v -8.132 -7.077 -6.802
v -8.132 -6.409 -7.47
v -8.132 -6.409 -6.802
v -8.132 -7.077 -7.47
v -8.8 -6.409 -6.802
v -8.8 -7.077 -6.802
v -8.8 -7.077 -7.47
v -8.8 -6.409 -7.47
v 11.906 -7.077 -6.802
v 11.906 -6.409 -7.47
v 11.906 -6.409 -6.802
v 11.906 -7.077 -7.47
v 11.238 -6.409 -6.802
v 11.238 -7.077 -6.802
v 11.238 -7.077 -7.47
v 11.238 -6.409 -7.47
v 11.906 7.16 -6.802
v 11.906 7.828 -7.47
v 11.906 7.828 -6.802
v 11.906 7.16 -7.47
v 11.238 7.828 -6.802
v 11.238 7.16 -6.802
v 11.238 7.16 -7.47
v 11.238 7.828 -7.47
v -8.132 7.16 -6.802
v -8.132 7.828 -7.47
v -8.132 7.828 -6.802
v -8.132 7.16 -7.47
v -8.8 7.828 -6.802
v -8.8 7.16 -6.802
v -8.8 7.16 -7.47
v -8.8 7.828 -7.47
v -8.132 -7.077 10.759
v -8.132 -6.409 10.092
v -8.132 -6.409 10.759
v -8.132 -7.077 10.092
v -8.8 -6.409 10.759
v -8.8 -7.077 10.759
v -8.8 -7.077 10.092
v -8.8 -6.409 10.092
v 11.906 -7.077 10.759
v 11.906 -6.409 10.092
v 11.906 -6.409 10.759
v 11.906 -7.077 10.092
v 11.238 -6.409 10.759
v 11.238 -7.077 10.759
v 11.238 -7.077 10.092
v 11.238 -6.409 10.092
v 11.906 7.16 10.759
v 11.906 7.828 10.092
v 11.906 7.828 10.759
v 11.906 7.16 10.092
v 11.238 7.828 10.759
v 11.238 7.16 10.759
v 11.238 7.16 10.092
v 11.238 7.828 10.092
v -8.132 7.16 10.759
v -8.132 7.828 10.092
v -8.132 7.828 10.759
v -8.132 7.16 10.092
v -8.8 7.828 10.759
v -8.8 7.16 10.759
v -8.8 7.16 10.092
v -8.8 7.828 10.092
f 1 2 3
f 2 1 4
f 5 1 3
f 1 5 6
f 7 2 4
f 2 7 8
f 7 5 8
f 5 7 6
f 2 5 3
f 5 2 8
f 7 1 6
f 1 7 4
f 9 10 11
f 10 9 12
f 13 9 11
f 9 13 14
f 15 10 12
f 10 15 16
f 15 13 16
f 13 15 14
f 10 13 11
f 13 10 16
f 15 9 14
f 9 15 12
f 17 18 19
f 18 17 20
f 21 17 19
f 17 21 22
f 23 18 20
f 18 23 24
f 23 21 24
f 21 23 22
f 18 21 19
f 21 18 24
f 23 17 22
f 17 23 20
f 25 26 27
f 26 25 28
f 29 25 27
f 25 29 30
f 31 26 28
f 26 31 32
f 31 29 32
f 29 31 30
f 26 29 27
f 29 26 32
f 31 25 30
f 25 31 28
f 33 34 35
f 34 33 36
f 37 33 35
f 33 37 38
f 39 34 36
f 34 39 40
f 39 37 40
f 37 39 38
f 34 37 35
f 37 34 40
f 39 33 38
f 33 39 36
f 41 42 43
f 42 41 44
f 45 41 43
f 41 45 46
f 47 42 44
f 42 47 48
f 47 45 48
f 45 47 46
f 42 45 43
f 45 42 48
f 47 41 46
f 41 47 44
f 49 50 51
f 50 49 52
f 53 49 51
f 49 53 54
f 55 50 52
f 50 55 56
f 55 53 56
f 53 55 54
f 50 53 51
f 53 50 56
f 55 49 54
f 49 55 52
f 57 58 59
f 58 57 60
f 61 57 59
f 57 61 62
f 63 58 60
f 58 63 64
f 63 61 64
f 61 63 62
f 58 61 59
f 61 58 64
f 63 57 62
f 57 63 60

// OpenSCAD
opU = 1; // 1 union
opI = 2; // 1 intersection
opS = 3; // 1 subtraction
opT = 4; // M transformation 4X4 functional
opH = 5; // 1 Convex hull
opE = 6; // 3 Extrude 2d shape, simple Z extrude of a subtree of Z plane cut (Q collapsed to z=0)
opO = 7; // 1 offset usually by distance but xyz surface normal or ambinet occlusion is possiblites
opD = 8; // ""not impleneted"" deformation modifyers [twist, bend, pinch, displace, taper]
opX = 9; // ""not impleneted"" deformation modifyers [twist, bend, pinch, displace, taper]
f_cube = 10; // unit radius cube
f_sphere = 11; // unit radius sphere
f_torus = 12; // unit radius torus
//named numbers
opc = 0;params = 1;subTree = 2;x = 0;y = 1;z = 2;null3 = [0, 0, 0];tiny = 0.01;far = 10000;
 
//scenegraph descriptor
scenegraph = [opT, [ [1,0, 1], [0, 0, 0], [1, 1, 1] ],
 [ [opT, [ [0, 0, 0], [0, 0, 0], [1, 1, 1] ],
     [ [opU, 0/*round union !!*/, [ 
         [opT, [  [ 0, 0  , 0],   [-54.4881, -1.1109, -21.3758],  [1, 1, 1] ],
             [  [f_sphere, [[15,12,9], 3,1]] ]]
 


         ]
    ]
    ]
 ]
 ]
];
// scenegraph=[opT,[ [ 00, 0, 0],[ 0, 0,0],[ 1, 1,1]],
//  [[opO,0,
// 
// [ [cR3,[5]] ,[cR3,[3]] 
// 
// ]]
// ]];
//////////////////////////////////////////////////////////////////////////////////////
//////////////////////////////////////////////////////////////////////////////////////
// It starts here
 cell = autobound(scenegraph, cubic = false, pad = 0.125);
 
//cell = [[-10,-10,-10],[10,10,10]];
 
*translate([100, 0, 0]) color("Red") showcell(cell);
*translate([100, 0, 0]) unglymarch(scenegraph, cell, c = 6);

*color("Red") showcell(cell);
* showfield(scenegraph, cell*2, len3(cell[1] -
 cell[0]) / 100);
 
translate([-0, 0, 0]) color("Red") showcell(cell);
 
translate([ 0, 0, 0]) DualC(scenegraph, cell , depth =3);
 

//////////////////////////////////////////////////////////////////////////////////////
/* Dual Contour 
 This DC runs in two stages because unmutable data and fake QEF solver
 first we run trough all octnodes with sign change
 for each find each crossed edge, construct planes, encode cell hash,
 return a [hash of the cellbase coord, a vertex coord, 
 3 prototype faces to hypothetical neighbous hashes,list of feature planes] 
 all these cell packages are concatenated to a list and the octtree is done with

 The list is filtered for some junk
 A clean list of points is established each with corresponding index as the filterlist

 A face worker runs the raw hash referencing faces searches for points with corresponding hash and building a list of faces with point index instead of hash numbers 

 Usually the fitting of features are done in the octtree but here its delayed to after a mesh connectivity is established.
We establish a list of neighbouring faces for each point and calculate each face mindpoint.
since each ponit now is associated with a bag of planes
we can iterativley constrain each point closer to an avarege of its feature planes
and circumvent the QEF solver.
A few loops alternating constraining to planes and avareging between neigbours
results in a nicelt spaced mesh. (a few edgecase bugs)
*/
module DualC(scene, cell_in, depth = 3) {
 cell = len(cell_in) == 0 ? autobound(scene, cubic = false, pad =
 0.5) : cell_in;* color("Red") showcell(cell);
 RawMesh = octree(cell, scene, depth);
 t = polishup(RawMesh, cell);
 //// echo(cell,len(t[0]),len(t[1]) );
// for(i=t[0])echo(i);
 //// polyhedron(t[0], t[1]);
trender2(t);
texport(t);
}

function polishup(v, cell) =
let (filterv = [
 for (i = [0: len(v) - 1])
 if (v[i][1][0] != undef) v[i]
 ], points = [
 for (i = [0: len(filterv) - 1]) filterv[i][1]
 ], 
// for(i=[0:len(v)-1]){if(v[i][1][0] !=undef) echo (v[i]);//translate(v[i][1])cube(0.6);}
 faces = faceworker(filterv), 
neighbours = [ for (i = [0: len(points) - 1])[ for (j = [0: len(faces) - 1])
 if (faces[j][0] == i || faces[j][1] == i || faces[j][2] == i || faces[j][3] == i) j] ], 
t = relax(points, faces, neighbours, filterv, cell))
t
//[points,faces]
;

function relax(points, faces, neighbours, filterv, cell, c =  25) = c >
 0 ?
 let (midpoints = [
 for (i = [0: len(faces) - 1]) avrg(
 [points[faces[i][0]], points[faces[i][1]], points[faces[i][
 2
 ]], points[faces[i][3]]])
 ], points2 = [
 for (i = [0: len(points) - 1]) len(neighbours[i]) > 0 ? findp2p(
 avrg([
 for (j = [0: len(neighbours[i]) - 1]) midpoints[
 neighbours[i]
 [j]]
 ]), filterv[i][3], cell[0], cell[1]) : points[i]
 ])
relax(points2, faces, neighbours, filterv, cell, c - 1): [points,
 faces
];
//////////////////////////////////////////////////////////////////////////////////////
//////////////////////////////////////////////////////////////////////////////////////
// arrange bundary box from sloppy to proper orientation of minor corner and major corner
function bflip(a, b) = [
 [min(a.x, b.x), min(a.y, b.y), min(a.z, b.z)],
 [max(a.x, b.x), max(a.y, b.y), max(a.z, b.z)]
];

function octree(cell, scene, subdivision = 6) =
/*O= cell origin S=cell max corner C=cell center D= cell size*/
let (O = cell[0], S = cell[1], C = (O + S) / 2, D = S - O, maxD = max(
 D.x, D.y, D.z), eO = eval(O, scene), eC = eval(C, scene), p1 = O,
 p2 = ([S.x, O.y, O.z]), p3 = ([O.x, S.y, O.z]), p4 = ([O.x,
 O.y, S.z
 ]), p5 = ([S.x, S.y, O.z]), p6 = ([S.x,
 O.y, S.z
 ]), p7 = ([O.x, S.y, S.z]), p8 = ([S.x,
 S.y, S.z
 ]), p9 = C)
// if 
subdivision > 0 ?
 // if DF at cell center i larger than aproximate cell bundary sphere then do nothing
 abs(eC) > maxD * 1.71 * 0.5 ? [] : concat(
 // else split cell in 8 new cells constructed by corners and center point
octree(bflip(p1, C), scene, subdivision - 1), octree(bflip(p2, C), scene, subdivision - 1), 
octree(bflip(p3, C), scene, subdivision - 1), octree(bflip(p4, C), scene, subdivision - 1), 
octree(bflip(p5, C), scene, subdivision - 1), octree(bflip(p6, C), scene, subdivision - 1), 
octree(bflip(p7, C), scene, subdivision - 1), octree(bflip(p8, C), scene, subdivision - 1)) :
 let (
e1 = eval(p1, scene), e2 = eval(p2, scene), 
e3 = eval(p3, scene), e4 = eval(p4, scene), 
e5 = eval(p5, scene), e6 = eval( p6, scene),
e7 = eval(p7, scene), e8 = eval(p8, scene), 
face1 = [encode(C), encode(C + [0, -D.y, 0]), encode(C + [0, -D.y, -D.z]), encode(C + [ 0, 0, -D.z ]) ], 
face2 = [encode(C), encode(C + [-D.x, 0, 0]), encode(C + [-D.x, 0, -D.z ]), encode(C + [0, 0, -D.z]) ], 
face3 = [encode(C), encode(C + [ 0, -D.y, 0 ]), encode(C + [-D.x, -D.y, 0]), encode(C + [-D.x, 0, 0]) ], 
planelista = makepl(scene, e1, e2, e3, e4, e5, e6, e7, e8, p1, p2, p3, p4, p5, p6, p7, p8), // list of planes intersecting edges of current cell
 planelistb = [
 for (i = [0: len(planelista) - 1])
 if (planelista[i][1] != [undef]) planelista[i]
 ], //filter planelist
 planelistc = len(planelistb) <= 0 ? concat(planelistb, [
 [p9, un(v3(evalnorm(p9, scene)))]
 ]) : planelistb, // if plane list is short add p9
 pointa = push(C, scene, C - D * 1, C + D * 1), // Snap vertecies to nearst zero boundary inside cell
 planeC = len(planelistb) > 0 ? avrg(
 [
 for (i = [0: len(planelistb) - 1]) planelistb[i][0]
 ]) : pointa, pointb = normeq(planelistc) <= 0.1 ? pointa :
 findp2p(planeC, planelistc, C - D * 1, C + D * 0.5), // feature detector
 pointc = pointb // lerp(pointb, push(planeC,scene,C-D*0.49 ,C+D* 0.49),0.5)
 )
abs(eC) < maxD * 1.75 * 0.5 ? [
 [encode(C), C, [
 sign(e1) == sign(e2) ? [] : sign(e1) > 0 ? face1 : rev(face1),
 sign(e1) == sign(e3) ? [] : sign(e1) > 0 ? rev(face2) : (
 face2),
 sign(e1) == sign(e4) ? [] : sign(e1) > 0 ? rev(face3) : (
 face3)
 ], planelistb]
] : [];
//////////////////////////////////////////////////////////////////////////////////////
//////////////////////////////////////////////////////////////////////////////////////
// are these normals almost the same?
function normeq(pl) = 
let (sums = avrg([
 for (i = [0: len(pl )- 1])
 for (j = [0: len(pl) - 1])(-1 + dot(pl[i][1], pl[j][1]))
])) abs(sums);

////////////
////////////
////////////
////////////
////////////
// feature detector fake QEF-solver
function findp2p(inp, pl, mi, ma, f = 500) =
let (p = mima3(inp, mi, ma))
f > 0 && len(pl) > 0   ?

 let (q = avrg([ for (i = [0: len(pl) - 1]) point2plane(p, pl[i][0], pl[i][1])
 ]), df = q - p) 

len3(df)>0.01?findp2p((p + (df * 0.9)), pl, mi, ma, f - 1) : p:p;
////////////
////////////
////////////
////////////
////////////

// project a point to a plane
function point2plane(p, o, n) =
let (v = o - p) p + (n * (v.x * n.x + v.y * n.y + v.z * n.z)); //proj ap to a plane

// push point along gradient to zero boundary in a few steps
function push(inp, scene, mi, ma, c = 4) =
let (p = mima3(inp, mi, ma)) let (q = evalnorm(p, scene), np = p + un(
 [q.x,
 q.y, q.z
 ]) * (-q[3] * 0.95)) c > 0 ? push(np, scene, mi, ma, c - 1) : np;

//  find the zero point between two points of difrent sign
function inter(t, r) = (sign(t) == sign(r)) ? undef: abs(0 - t) / max(
 abs(t - r), 0.0000001); //find zero point


// build list of planes at intersected edges [p,N]
function makepl(scene, e1, e2, e3, e4, e5, e6, e7, e8, p1, p2, p3, p4,
 p5, p6, p7, p8) =
let (
s12 = inter(e1, e2), s13 = inter(e1, e3), s14 = inter(e1, e4), s52 = inter(e5, e2), 
s53 = inter(e5, e3), s58 = inter(e5, e8), s64 = inter(e6, e4), s62 = inter(e6, e2), 
s68 = inter(e6, e8), s74 = inter(e7, e4), s73 = inter(e7, e3), s78 = inter(e7, e8),
 
p12 = (s12 == undef) ? [lerp(p1, p2, 0.5), [undef]] : let (mp1 = lerp(p1, p2, s12))[mp1, un(v3(evalnorm(mp1, scene)))], 
p13 = (s13 == undef) ? [ lerp(p1, p3, 0.5), [undef] ] : let (mp2 = lerp(p1, p3, s13))[mp2, un(v3(evalnorm(mp2, scene)))],
 
 p14 = (s14 == undef) ? [lerp(p1, p4, 0.5), [ undef ]] : let (mp3 = lerp(p1, p4, s14))[mp3, un(v3(evalnorm(mp3, scene)))],
 p52 = (s52 == undef) ? [lerp(p5, p2, 0.5), [undef]] : let (mp4 = lerp(p5, p2, s52))[mp4, un(v3(evalnorm(mp4, scene)))], 
p53 = (s53 == undef) ? [ lerp(p5, p3, 0.5), [undef] ] : let (mp5 = lerp(p5, p3, s53))[mp5, un(v3(evalnorm(mp5, scene)))],
 p58 = (s58 == undef) ? [lerp(p5, p8, 0.5), [ undef ]] : let (mp6 = lerp(p5, p8, s58))[mp6, un(v3(evalnorm(mp6, scene)))],
 p64 = (s64 == undef) ? [lerp(p6, p4, 0.5), [undef]] : let (mp7 = lerp(p6, p4, s64))[mp7, un(v3(evalnorm(mp7, scene)))],
 p62 = (s62 == undef) ? [ lerp(p6, p2, 0.5), [undef] ] : let (mp8 = lerp(p6, p2, s62))[mp8, un(v3(evalnorm(mp8, scene)))],
p68 = (s68 == undef) ? [lerp(p6, p8, 0.5), [ undef ]] : let (mp9 = lerp(p6, p8, s68))[mp9, un(v3(evalnorm(mp9, scene)))],
p74 = (s74 == undef) ? [lerp(p7, p4, 0.5), [undef]] : let (mp10 = lerp(p7, p4, s74))[mp10, un(v3(evalnorm(mp10, scene)))], 
p73 = ( s73 == undef) ? [lerp(p7, p3, 0.5), [undef]] : let (mp11 = lerp( p7, p3, s73))[mp11, un(v3(evalnorm(mp11, scene)))], 
p78 = (s78 == undef) ? [lerp(p7, p8, 0.5), [ undef ]] : let (mp12 = lerp(p7, p8, s78))[mp12, un(v3(evalnorm(mp12, scene)))])

[p12, p13, p14, p52, p53, p58, p64, p62, p68, p74, p73,
 p78];
//////////////////////////////////////////////////////////////////////////////////////
//////////////////////////////////////////////////////////////////////////////////////
//function encode(p)=str("X", (p.x),"Y", (p.y),"Z", (p.z));// build search key from xyz
//find and connect surrounding points to faces
// new encode: hash a vertex by seeded pseudo random 
function encode(v) =
let (xseed = round(rnd(1e8, -1e8,    round(v.x * 1e6))), 
yseed = round(rnd(1e8, - 1e8, xseed +  round(v.y * 1e6))), 
zseed = round(rnd( 1e8, -1e8, yseed + round(v.z * 1e6))), 
hash =
 round (rnd(1e8, -1e8, zseed)))
hash;

function faceworker(v) =
let (index = [
 for (i = [0: len(v) - 1]) v[i][0]
], a = [
 for (i = [0: len(v) - 1])
 if (v[i][2][0] != [])[find(v[i][2]
 [0][0], index), find(v[i][2]
 [0][1], index), find(v[i][2]
 [0][2], index), find(v[i][2]
 [0][3], index)]
], b = [
 for (i = [0: len(v) - 1])
 if (v[i][2][1] != [])[find(v[i][2]
 [1][0], index), find(v[i][2]
 [1][1], index), find(v[i][2]
 [1][2], index), find(v[i][2]
 [1][3], index)]
], c = [
 for (i = [0: len(v) - 1])
 if (v[i][2][2] != [])[find(v[i][2]
 [2][0], index), find(v[i][2]
 [2][1], index), find(v[i][2]
 [2][2], index), find(v[i][2]
 [2][3], index)]
])
concat(a, b, c);
//reverse list(face)
function rev(v) = [
 for (i = [len(v) - 1: -1: 0]) v[i]
];
//like search() but works with string key used to build polyhedron 
//function find(key,list)=[for(i=[0:len(list)-1])if(key==list[i][0])i][0];
// new find(): dont relies on strings anymore so it can use faster search. 
function find(key, list) = search(key, list, num_returns_per_match =
 1)[0];
// return vec4 of normal and distance at point q
//////////////////////////////////////////////////////////////////////////////////////
////////////////////////////////////////////////////////////////////////////////////////////////////////////////////////////////////////////////////////////////////////////
//////////////////////////////////////////////////////////////////////////////////////
//////////////////////////////////////////////////////////////////////////////////////
// marching cubes manifold
module unglymarch(scene, cell, c = 5) {
 O = cell[0];
 S = cell[1];
 C = (O + S) / 2;
 D = S - O;
 maxD = len3(D.x, D.y, D.z);
 eC = eval(C, scene);
 p1 = O;
 p2 = ([S.x, O.y, O.z]);
 p3 = ([O.x, S.y, O.z]);
 p4 = ([O.x, O.y, S.z]);
 p5 = ([S.x, S.y, O.z]);
 p6 = ([S.x, O.y, S.z]);
 p7 = ([O.x, S.y, S.z]);
 p8 = ([S.x, S.y, S.z]);
 if (eC < maxD * 2) {
 if (eC < -maxD) {
 translate(C) cube(D, center = true);
 } else if (c > 0) {
 unglymarch(scene, bflip(p1, C), c - 1);
 unglymarch(scene, bflip(p2, C), c - 1);
 unglymarch(scene, bflip(p3, C), c - 1);
 unglymarch(scene, bflip(p4, C), c - 1);
 unglymarch(scene, bflip(p5, C), c - 1);
 unglymarch(scene, bflip(p6, C), c - 1);
 unglymarch(scene, bflip(p7, C), c - 1);
 unglymarch(scene, bflip(p8, C), c - 1);
 } else {
 // Unfinnished fullMC 
 //hull(){
 // 
 //if (eval(p1,scene)<0)translate(p1) cube(D/100,center=true);
 //if (eval(p2,scene)<0)translate(p2) cube(D/100,center=true);
 //if (eval(p3,scene)<0)translate(p3) cube(D/100,center=true);
 //if (eval(p4,scene)<0)translate(p4) cube(D/100,center=true);
 //if (eval(p5,scene)<0)translate(p5) cube(D/100,center=true);
 //if (eval(p6,scene)<0)translate(p6) cube(D/100,center=true);
 //if (eval(p7,scene)<0)translate(p7) cube(D/100,center=true);
 //if (eval(p8,scene)<0)translate(p8) cube(D/100,center=true);
 //}
 translate(C) cube(D, center = true);
 }
 } else {}
}
//////////////////////////////////////////////////////////////////////////////////////
//////////////////////////////////////////////////////////////////////////////////////
//
////////////////////////////////////////////////////////////////////////////////////////////////////////////////////////////////////////////////////////////////////////////
////////////////////////////////////////////////////////////////////////////////////////////////////////////////////////////////////////////////////////////////////////////
//////////////////////////////////////////////////////////////////////////////////////
function evalnorm(q, scene) =
let (tiny = 0.00001, e = eval(q, scene))[e - eval([q.x - tiny, q.y, q
 .z
], scene), e - eval([q.x, q.y - tiny,
 q.z
], scene), e - eval([q.x, q.y, q.z - tiny], scene), e];
 
//////////////////////////////////////////////////////////////////////////////////////
 
//////////////////////////////////////////////////////////////////////////////////////
// testing primitives
//parser
function eval(p, scene) = parse(p, scene);

function parse(q, scene) =
let (opcode = scene[opc], p = scene[params])
//if code then
opcode == opX ? parseopX(q, p, scene[subTree]) : // 9 experimental
 opcode == opU ? parseopU(q, p, scene[subTree]) : // 1
 opcode == opI ? parseopI(q, p, scene[subTree]) : // 2
 opcode == opS ? parseopS(q, p, scene[subTree]) : // 3
 opcode == opT ? parseopT(q, p, scene[subTree]) : //4
 opcode == opH ? parseopH(q, p, scene[subTree]) : //5 hull behaves like union for now:
 opcode == opE ? parseopE(q, p, scene[subTree]) : //6
 opcode == opO ? parseopO(q, p, scene[subTree]) : //7
 opcode == opD ? parseopT(q, null3, scene[subTree]) : //8 deform behaves like null trnasform for now
// debugging with hardcoded cube 
opcode == f_cube ? cube(q, 7.5,0) : //10
 opcode == f_sphere ? chamfered_filleted_block_eval(q, p[0],p[1],p[2]) : //10
 opcode == f_torus ? torus(q, 15,5) : //10
 0;

function parseopH(q, p, scene) =
let (vp = [opU, 0, [
 for (i = [0: len(scene) - 1]) scene[i]
]], e = eval(q, vp))
Hulltrace(q, q, vp);

function parseopE(q, p, scene) = min([
 for (i = [0: len(scene) - 1]) max(eval([q.x, q.y, 0], scene[i]),
 max(0, abs(q.z)) - p)
]);

function parseopX(q, p, scene) = pow(addl([
 for (i = [0: len(scene) - 1]) pow(eval(q, scene[i]), 2)
]), 1 / 2);

function parseopU(q, p, scene) = minl([
 for (i = [0: len(scene) - 1]) eval(q, scene[i])
], p);

function parseopI(q, p, scene) = maxl([
 for (i = [0: len(scene) - 1]) eval(q, scene[i])
], p);

function parseopS(q, p, scene) = maxR(-minl([
 for (i = [1: max(1, len(scene) - 1)]) eval(q, scene[i])
], p), eval(q, scene[0]), p);

function parseopO(q, p, scene) = Offs(min([
 for (i = [0: len(scene) - 1]) eval(q, scene[i])
]), p);

function parseopT(q, M, scene) =let(
qn=un(q),
Tqm=Transf(q, M),
d=( qn.x*M[2][0]+qn.y*M[2][1]+qn.z*M[2][2])
) min([
 for (i = [0: len(scene) - 1]) eval(Tqm, scene[i])*M[2].x]);

function Transf(q, M) = invtransform(q, M[0], M[1], M[2]);

function Offs(q, M) = q - M;
//function Clampz(q,p)=[q[x],q[y],0];
function Hulltrace(q, qp, vp, c = 8) =
let (nm = evalnorm(qp, vp), n = [nm[0],
 nm[1], nm[2]
], m = nm[3])
c > 0 ? Hulltrace(q, qp + (n * max(1, abs(m))), vp, c - 1) :
 //eval(q+un(q)*far,vp)-len3(q-(un(qp-q)*far))
 len3(qp - q) - m;

function cR3(p, params) =
let (r = params[0])
torus(p, r, r / 4);
// end parser
//function cR3(q,r)=max(
//maxCH(abs(q.x)-3,abs(q.y)-3,1) ,
//maxCH(abs(q.x)-3,abs(q.z)-3,1) ,
//maxCH(abs(q.y)-3,abs(q.z)-3,1) )
// 
//; 
function ChamferBox(op, b = [1, 1, 1] /*[l,w,h]*/ , ch = 2 /*Chamfer*/ ,
 r = 1 /*radius*/ ) =
// radius and chanfer work independently but not as inteded when combined
let (p = max3(abs3(op) - ((b - [ch, ch,
 ch
 ]) - [r, r, r]), 0.0), plane_normal = un([1, 1, 1]), // other directions may be useful
 ray_origin = [0, 0, 0], ray_direction = un(p), plane_origin = [ch,
 0, 0
 ], distance = (dot(plane_normal, (plane_origin - ray_origin))) /
 dot(plane_normal, ray_direction), location = ray_origin + (
 ray_direction * distance))
min(0, max(p.x, p.y, p.z)) + // tried to get them internal distances correct
 max(0, len3(max3(p - location, 0)) - r);










function chamfered_filleted_block_eval(p, size, ch, r) =
let (M = [
 [1, 0, 0],
 [0, 1, 0],
 [0, 0, 1], // box bounds
 [1, 1, 0] / sqrt(2), [0, 1, 1] / sqrt(2), [1, 0, 1] / sqrt(2), // edge chamfer bounds
 [1, 1, 1] / sqrt(3)
 ], // vertex chamfer bounds, 
 cr = (ch - sqrt(2) * r / tan(67.5)) / sqrt(2), d = _abs(p) - size /
 2 + [r,
 r, r
 ]) 

  (  // offset
   max(M * d + [0, 0, 0, cr, cr, cr, cr * sqrt(3) ]) // distance inside scene

 +( norm(clampMin(M * d + [0, 0, 0, cr, cr, cr, cr * sqrt(3) ], 0))*0.1 -r)
); // distance outside scene









function clampMin(v, lim) = [
 for (vi = v) max(vi, lim)
];

function _abs(v) = [
 for (vi = v) abs(vi)
];
function plane(p, plane) =
let (q = p - plane[1]) dot(q, plane[0]);

function cube(p, b = 1, r = 0) =
let (d = abs3(p) - [b - r, b - r, b - r])
(min(max(d.x, d.y, d.z), 0.0) + len3(max3(d, 0.0)) - r);

function sphere(p, b = 1) = len3(p) - b;

function supersphere(p, r = 15, d = 2, c = 0) =
let (n = un(p)) len3(p) - r + (sin(atan2(n.y, n.x) * 8) * d + sin(
 atan2(atan2(n.y, n.x) / 90, n.z) * 8) * d);

function torus(p, tx = 2.9, ty = 0.61) =
let (q = [len3([p.x, p.z]) - tx, p.y]) len3(q) - ty;

function _torus_eval(pt, R, r) =
let (n = norm([pt[0], pt[1]]))
r - norm(pt - [pt[0], pt[1], 0] * R / n);

function box(p1, b = 0.71) =
let (p = p1 + [0.1, 0.6, 1.5]) len3(p) - b;

function minl(l, r, c = 0) = c < len(l) - 1 ? minR(l[c], minl(l, r, c +
 1), r) : l[c];

function maxl(l, r = 3, c = 0) = c < len(l) - 1 ? maxR(l[c], maxl(l,
 r, c + 1), r) : l[c];

function minR(d1, d2, r = 5) = r > 0 ?
 let (m = min(d1, d2))(abs(d1) < abs(r) && abs(d2) < abs(r)) || (d1 <
 r && d2 < r) ? min(m, r - len3([r - d1, r - d2])) : m : let (m =
 min(d1, d2), rr = -r)(d1 < rr && d2 < rr) ? min(m, len3([d1, d2]) -
 rr) : m;

function maxR(d1, d2, r) =
let (m = max(d1, d2))(d1 > -r && d2 > -r) ? max(m, -r + len3([-r - d1, -
 r - d2
])): m;

function maxCH(d1, d2, r) =
let (m = min(-d1, -d2))(-d1 < r && -d2 < r) ? -min(m, -d1 + -d2 - r):
 -m;
//////////////////////////////////////////////////////////////////////////////////////
//////////////////////////////////////////////////////////////////////////////////////
//////////////////////////////////////////////////////////////////////////////////////
module trender(t) {
 C0 = (un(rndc()) + [2, 0, 0]);
 C1 = (un(rndc()) + [2, 2, 0]);
 C2 = (un(rndc()) + [0, 2, 2]);
 for (i = [0: max(0, len(t[1]) - 1)]) {
 n = un(p2n(t[0][t[1][i][0]], t[0]
 [t[1][i][1]], t[0][t[1][i][
 2
 ]]));
 color(un((C0 * abs(n[0]) + C1 * abs(n[1]) + C2 * abs(n[2]) + [
 1, 1, 1
 ] * abs(n[2])) / 4)) polyhedron(t[0], [t[1][i]]);
 }
}
module trender2(t) {
 C0 = (un(rndc()) + [2, 0, 0]);
 C1 = (un(rndc()) + [2, 2, 0]);
 C2 = (un(rndc()) + [0, 2, 2]);
 for (i = [0: max(0, len(t[1]) - 1)]) {
 n = un(p2n(t[0][t[1][i][0]], t[0]
 [t[1][i][1]], t[0][t[1][i][
 2
 ]]));
 color((rndc(seed=i) + [0.5, 1, 1]) / 2) mupolyhedron(t[0], t[1][i]);
 }
}
module texport (t)
{
t0=t[1];
t2=fp_flatten([for(i=[0:len(t0)-1])let (t1=t0[i])[ [t1[0],t1[1],t1[2]],[t1[0],t1[2],t1[3]] ] ]);
echo([t[0],t2]);
}
module mupolyhedron(P, f) // polyhederon with quad edge flip optimization 
{
 p0 = P[f[0]];
 p1 = P[f[1]];
 p2 = P[f[2]];
 p3 = P[f[3]];
 m02 = lerp(p0, p2, 0.5); // midpoints - a quad has two
 m13 = lerp(p1, p3, 0.5);
 e02 = eval(m02); // disteance fiedl at mid points
 e13 = eval(m13);
 /////////////// /add convexity check here ///////// //////////////////
 if (abs(e02 - e13) < 0.001) // if almost the same flip to minimize needle triangles
 {
 if (len3(p0 - p2) < len3(p1 - p3)) // select shortes diagonal
 {
 //translate(m02)sphere(0.6,center=true); // show fliped edga
 polyhedron([p0, p1, p2], [
 [0, 1, 2]
 ]);
 polyhedron([p2, p3, p0], [
 [0, 1, 2]
 ]);
 } else {
 //translate(m13)sphere(0.6,center=true);// show fliped edga
 polyhedron([p1, p2, p3], [
 [0, 1, 2]
 ]);
 polyhedron([p3, p0, p1], [
 [0, 1, 2]
 ]);
 }
 } else if (abs(e02) < abs(e13)) // edge flipping - per quad for closeet feature 
 {
 // translate(m02)cube(0.6,center=true);// show fliped edga
 polyhedron([p0, p1, p2], [
 [0, 1, 2]
 ]);
 polyhedron([p2, p3, p0], [
 [0, 1, 2]
 ]);
 } else {
 // translate(m13)cube(0.6,center=true);// show fliped edga
 polyhedron([p1, p2, p3], [
 [0, 1, 2]
 ]);
 polyhedron([p3, p0, p1], [
 [0, 1, 2]
 ]);
 }
}
//////////////////////////////////////////////////////////////////////////////////////
//////////////////////////////////////////////////////////////////////////////////////
function p2n(pa, pb, pc) =
let (u = pa - pb, v = pa - pc) un([u[1] * v[2] - u[2] * v[1], u[2] *
 v[0] - u[0] * v[2], u[0] * v[1] - u[1] * v[0]
]);


function avrg(l) = len(l) > 1 ? addl(l) / (len(l)) : l;

function lerp(start, end, bias) = (end * bias + start * (1 - bias));

function un(v) = v / max(len3(v), 0.000001) * 1; // div by zero safe unit normal
function dot(v1, v2) = v1[0] * v2[0] + v1[1] * v2[1] + v1[2] * v2[2];
 function fp_flatten(l) = [   for (a = l)     for (b = a) b ];



//function rnd(a = 1, b = 0) = (rands(min(a, b), max(a, b), 1)[0]);
function rnd(a = 1, b = 0, s = []) = s == [] ? (rands(min(a, b), max(
 a, b), 1)[0]) : (rands(min(a, b), max(a, b), 1, s)[0]);

function rndc(a = 1, b = 0,seed) = [rnd(a, b,seed),
 rnd(a, b,seed+1), rnd(a, b,seed+2)
];
function addl(l, c = 0) = c < len(l) - 1 ? l[c] + addl(l, c + 1) : l[
 c];
function len3(v) = len(v) > 1 ? sqrt(addl([
 for (i = [0: len(v) - 1]) pow(v[i], 2)
])) : len(v) == 1 ? v[0] : v;
function un(v) = v / max(len3(v), 0.000001) * 1; // div by zero safe unit normal
function dot(v1, v2) = v1[0] * v2[0] + v1[1] * v2[1] + v1[2] * v2[2];
function v3(p) = [p.x, p.y, p.z]; // vec3 formatter
function abs3(v) = [abs(v[0]), abs(v[1]),
 abs(v[2])
];

function max3(a, b) = [max(a[0], b),
 max(a[1], b), max(a[2], b)
];

function mima3(a, b, c) = [min(max(a[0], b[0]), c[0]),
 min(max(a[1], b[1]), c[1]), min(max(a[2], b[2]), c[2])
];

function invtransform(q, T = [0, 0, 0], R = [30, 30, 30], S = [1, 1,
 1
]) =
let (p = q)
Vdiv(t([p.x, p.y, p.z, 1] * m_translate(T * -1) * m_rotate(R * -1)),
 S);

function Vdiv(v1, v2) = [v1[0] / v2[0],
 v1[1] / v2[1], v1[2] / v2[2]
];

function t(v) = [v.x, v.y, v.z];

function m_rotate(v) = [
 [1, 0, 0, 0],
 [0, cos(v.x), sin(v.x), 0],
 [0, -sin(v.x), cos(v.x), 0],
 [0, 0, 0, 1]
] * [
 [cos(v.y), 0, -sin(v.y), 0],
 [0, 1, 0, 0],
 [sin(v.y), 0, cos(v.y), 0],
 [0, 0, 0, 1]
] * [
 [cos(v.z), sin(v.z), 0, 0],
 [-sin(v.z), cos(v.z), 0, 0],
 [0, 0, 1, 0],
 [0, 0, 0, 1]
];

function m_translate(v) = [
 [1, 0, 0, 0],
 [0, 1, 0, 0],
 [0, 0, 1, 0],
 [v.x, v.y, v.z, 1]
];

function m_scale(v) = [
 [v.x, 0, 0, 0],
 [0, v.y, 0, 0],
 [0, 0, v.z, 0],
 [0, 0, 0, 1]
];
module showcell(cell) {
 d = cell[0] - cell[1];
 s = max(abs(d.x), (d.y), (d.z)) / 30;#
 translate([cell[0][0], cell[0][1],
 cell[0][2]
 ]) cube(s);#
 translate([cell[1][0], cell[0][1],
 cell[0][2]
 ]) cube(s);#
 translate([cell[1][0], cell[1][1],
 cell[0][2]
 ]) cube(s);#
 translate([cell[0][0], cell[1][1],
 cell[0][2]
 ]) cube(s);#
 translate([cell[0][0], cell[0][1],
 cell[1][2]
 ]) cube(s);#
 translate([cell[1][0], cell[0][1],
 cell[1][2]
 ]) cube(s);#
 translate([cell[1][0], cell[1][1],
 cell[1][2]
 ]) cube(s);#
 translate([cell[0][0], cell[1][1],
 cell[1][2]
 ]) cube(s);
}

function autobound(scene, cubic = (false), pad = 1) =
let (up = findbound([0, 0, 1], scene), down = -findbound([0, 0, -1],
 scene), north = findbound([0, 1, 0], scene), south = -findbound([
 0, -1, 0
], scene), west = findbound([1, 0, 0], scene), east = -findbound([-
 1, 0, 0
], scene), esd = min(east, south, down), wnu = max(west, north, up))
cubic == true ?
 let (d = [wnu, wnu, wnu] - [esd, esd,
 esd
 ])[[esd, esd, esd] - (d * pad), [wnu,
 wnu, wnu
 ] + d * pad] : let (d = [west, north,
 up
 ] - [east, south, down])[[east, south,
 down
 ] - d * pad, [west, north, up] + d * pad];

function autohull(scene) =
let (far = 1000, p1 = un([1, 1, 1]) * far, p2 = un([-1, -1, 1]) * far,
 p3 = un([1, -1, -1]) * far, p4 = un([-1, 1, -1]) * far, n = concat(
 autohullworker(p1, p2, p3, scene, far), autohullworker(p1, p2, p4,
 scene, far), autohullworker(p2, p3, p4, scene, far),
 autohullworker(p1, p4, p3, scene, far)))[
 for (i = [1: len(n) - 1]) let (v = findbound(n[i], scene))[n[i], v *
 n[i], v]];

function autohullworker(p1, p2, p3, scene, far, c = 4) =
let (e1 = un(t(evalnorm(p1, scene))), e2 = un(t(evalnorm(p2, scene))),
 e3 = un(t(evalnorm(p3, scene))), p12 = un(
 (p1 + p2) / 2) * far, p23 = un((p2 + p3) / 2) * far, p31 = un((p3 +
 p1) / 2) * far, C = un(avrg([e1, e2, e3])), meancurve = (dot(e1,
 e2) + dot(e3, e2) + dot(e1, e3)))
meancurve > 2.1 || c <= 0 ? [C] : concat(autohullworker(p1, p12, p31,
 scene, far, c - 1), autohullworker(p2, p23, p12, scene, far, c -
 1), autohullworker(p3, p23, p31, scene, far, c - 1),
 autohullworker(p12, p23, p31, scene, far, c - 1));

function findbound(vec, scene) =
let (VeryFar = 1e6 ,
 p1 = vec * VeryFar, 
p2 = p1 + un(vec  ),
e1 = abs(eval(p1, scene)),
 e2 = abs(eval(p2, scene)), 
scale = abs(e2 - e1) , 
corrected = (e1 / scale), 
distance = VeryFar - e1/scale //distance= VeryFar-corrected
)
//[p1,p2,e1,e2,scale,corrected,distance ]
distance ;
module showfield(scene, cell, s = 2) {
 S = len3(cell[1] - cell[0]);
 for (iy = [cell[0][1]: s: cell[1][1]]) {
 for (ix = [cell[0][0]: s: cell[1]
 [0]
 ]) {
 //en=evalnorm([ix ,iy,0],scene);
 e = eval([ix, iy, 0], scene);
 r = min(0, sign(-e)) * sin(e * 40);
 g = 1 / max(1, abs(e));
 b = sin(e * 40) * min(1, -min(0, e));
 color([abs(r), abs(g), abs(b)])
 //color( [abs(en.x),abs(en.y),abs(en.z)] ) 
 translate([ix, iy, -1]) square(s, center = true);
 }
 }
}
